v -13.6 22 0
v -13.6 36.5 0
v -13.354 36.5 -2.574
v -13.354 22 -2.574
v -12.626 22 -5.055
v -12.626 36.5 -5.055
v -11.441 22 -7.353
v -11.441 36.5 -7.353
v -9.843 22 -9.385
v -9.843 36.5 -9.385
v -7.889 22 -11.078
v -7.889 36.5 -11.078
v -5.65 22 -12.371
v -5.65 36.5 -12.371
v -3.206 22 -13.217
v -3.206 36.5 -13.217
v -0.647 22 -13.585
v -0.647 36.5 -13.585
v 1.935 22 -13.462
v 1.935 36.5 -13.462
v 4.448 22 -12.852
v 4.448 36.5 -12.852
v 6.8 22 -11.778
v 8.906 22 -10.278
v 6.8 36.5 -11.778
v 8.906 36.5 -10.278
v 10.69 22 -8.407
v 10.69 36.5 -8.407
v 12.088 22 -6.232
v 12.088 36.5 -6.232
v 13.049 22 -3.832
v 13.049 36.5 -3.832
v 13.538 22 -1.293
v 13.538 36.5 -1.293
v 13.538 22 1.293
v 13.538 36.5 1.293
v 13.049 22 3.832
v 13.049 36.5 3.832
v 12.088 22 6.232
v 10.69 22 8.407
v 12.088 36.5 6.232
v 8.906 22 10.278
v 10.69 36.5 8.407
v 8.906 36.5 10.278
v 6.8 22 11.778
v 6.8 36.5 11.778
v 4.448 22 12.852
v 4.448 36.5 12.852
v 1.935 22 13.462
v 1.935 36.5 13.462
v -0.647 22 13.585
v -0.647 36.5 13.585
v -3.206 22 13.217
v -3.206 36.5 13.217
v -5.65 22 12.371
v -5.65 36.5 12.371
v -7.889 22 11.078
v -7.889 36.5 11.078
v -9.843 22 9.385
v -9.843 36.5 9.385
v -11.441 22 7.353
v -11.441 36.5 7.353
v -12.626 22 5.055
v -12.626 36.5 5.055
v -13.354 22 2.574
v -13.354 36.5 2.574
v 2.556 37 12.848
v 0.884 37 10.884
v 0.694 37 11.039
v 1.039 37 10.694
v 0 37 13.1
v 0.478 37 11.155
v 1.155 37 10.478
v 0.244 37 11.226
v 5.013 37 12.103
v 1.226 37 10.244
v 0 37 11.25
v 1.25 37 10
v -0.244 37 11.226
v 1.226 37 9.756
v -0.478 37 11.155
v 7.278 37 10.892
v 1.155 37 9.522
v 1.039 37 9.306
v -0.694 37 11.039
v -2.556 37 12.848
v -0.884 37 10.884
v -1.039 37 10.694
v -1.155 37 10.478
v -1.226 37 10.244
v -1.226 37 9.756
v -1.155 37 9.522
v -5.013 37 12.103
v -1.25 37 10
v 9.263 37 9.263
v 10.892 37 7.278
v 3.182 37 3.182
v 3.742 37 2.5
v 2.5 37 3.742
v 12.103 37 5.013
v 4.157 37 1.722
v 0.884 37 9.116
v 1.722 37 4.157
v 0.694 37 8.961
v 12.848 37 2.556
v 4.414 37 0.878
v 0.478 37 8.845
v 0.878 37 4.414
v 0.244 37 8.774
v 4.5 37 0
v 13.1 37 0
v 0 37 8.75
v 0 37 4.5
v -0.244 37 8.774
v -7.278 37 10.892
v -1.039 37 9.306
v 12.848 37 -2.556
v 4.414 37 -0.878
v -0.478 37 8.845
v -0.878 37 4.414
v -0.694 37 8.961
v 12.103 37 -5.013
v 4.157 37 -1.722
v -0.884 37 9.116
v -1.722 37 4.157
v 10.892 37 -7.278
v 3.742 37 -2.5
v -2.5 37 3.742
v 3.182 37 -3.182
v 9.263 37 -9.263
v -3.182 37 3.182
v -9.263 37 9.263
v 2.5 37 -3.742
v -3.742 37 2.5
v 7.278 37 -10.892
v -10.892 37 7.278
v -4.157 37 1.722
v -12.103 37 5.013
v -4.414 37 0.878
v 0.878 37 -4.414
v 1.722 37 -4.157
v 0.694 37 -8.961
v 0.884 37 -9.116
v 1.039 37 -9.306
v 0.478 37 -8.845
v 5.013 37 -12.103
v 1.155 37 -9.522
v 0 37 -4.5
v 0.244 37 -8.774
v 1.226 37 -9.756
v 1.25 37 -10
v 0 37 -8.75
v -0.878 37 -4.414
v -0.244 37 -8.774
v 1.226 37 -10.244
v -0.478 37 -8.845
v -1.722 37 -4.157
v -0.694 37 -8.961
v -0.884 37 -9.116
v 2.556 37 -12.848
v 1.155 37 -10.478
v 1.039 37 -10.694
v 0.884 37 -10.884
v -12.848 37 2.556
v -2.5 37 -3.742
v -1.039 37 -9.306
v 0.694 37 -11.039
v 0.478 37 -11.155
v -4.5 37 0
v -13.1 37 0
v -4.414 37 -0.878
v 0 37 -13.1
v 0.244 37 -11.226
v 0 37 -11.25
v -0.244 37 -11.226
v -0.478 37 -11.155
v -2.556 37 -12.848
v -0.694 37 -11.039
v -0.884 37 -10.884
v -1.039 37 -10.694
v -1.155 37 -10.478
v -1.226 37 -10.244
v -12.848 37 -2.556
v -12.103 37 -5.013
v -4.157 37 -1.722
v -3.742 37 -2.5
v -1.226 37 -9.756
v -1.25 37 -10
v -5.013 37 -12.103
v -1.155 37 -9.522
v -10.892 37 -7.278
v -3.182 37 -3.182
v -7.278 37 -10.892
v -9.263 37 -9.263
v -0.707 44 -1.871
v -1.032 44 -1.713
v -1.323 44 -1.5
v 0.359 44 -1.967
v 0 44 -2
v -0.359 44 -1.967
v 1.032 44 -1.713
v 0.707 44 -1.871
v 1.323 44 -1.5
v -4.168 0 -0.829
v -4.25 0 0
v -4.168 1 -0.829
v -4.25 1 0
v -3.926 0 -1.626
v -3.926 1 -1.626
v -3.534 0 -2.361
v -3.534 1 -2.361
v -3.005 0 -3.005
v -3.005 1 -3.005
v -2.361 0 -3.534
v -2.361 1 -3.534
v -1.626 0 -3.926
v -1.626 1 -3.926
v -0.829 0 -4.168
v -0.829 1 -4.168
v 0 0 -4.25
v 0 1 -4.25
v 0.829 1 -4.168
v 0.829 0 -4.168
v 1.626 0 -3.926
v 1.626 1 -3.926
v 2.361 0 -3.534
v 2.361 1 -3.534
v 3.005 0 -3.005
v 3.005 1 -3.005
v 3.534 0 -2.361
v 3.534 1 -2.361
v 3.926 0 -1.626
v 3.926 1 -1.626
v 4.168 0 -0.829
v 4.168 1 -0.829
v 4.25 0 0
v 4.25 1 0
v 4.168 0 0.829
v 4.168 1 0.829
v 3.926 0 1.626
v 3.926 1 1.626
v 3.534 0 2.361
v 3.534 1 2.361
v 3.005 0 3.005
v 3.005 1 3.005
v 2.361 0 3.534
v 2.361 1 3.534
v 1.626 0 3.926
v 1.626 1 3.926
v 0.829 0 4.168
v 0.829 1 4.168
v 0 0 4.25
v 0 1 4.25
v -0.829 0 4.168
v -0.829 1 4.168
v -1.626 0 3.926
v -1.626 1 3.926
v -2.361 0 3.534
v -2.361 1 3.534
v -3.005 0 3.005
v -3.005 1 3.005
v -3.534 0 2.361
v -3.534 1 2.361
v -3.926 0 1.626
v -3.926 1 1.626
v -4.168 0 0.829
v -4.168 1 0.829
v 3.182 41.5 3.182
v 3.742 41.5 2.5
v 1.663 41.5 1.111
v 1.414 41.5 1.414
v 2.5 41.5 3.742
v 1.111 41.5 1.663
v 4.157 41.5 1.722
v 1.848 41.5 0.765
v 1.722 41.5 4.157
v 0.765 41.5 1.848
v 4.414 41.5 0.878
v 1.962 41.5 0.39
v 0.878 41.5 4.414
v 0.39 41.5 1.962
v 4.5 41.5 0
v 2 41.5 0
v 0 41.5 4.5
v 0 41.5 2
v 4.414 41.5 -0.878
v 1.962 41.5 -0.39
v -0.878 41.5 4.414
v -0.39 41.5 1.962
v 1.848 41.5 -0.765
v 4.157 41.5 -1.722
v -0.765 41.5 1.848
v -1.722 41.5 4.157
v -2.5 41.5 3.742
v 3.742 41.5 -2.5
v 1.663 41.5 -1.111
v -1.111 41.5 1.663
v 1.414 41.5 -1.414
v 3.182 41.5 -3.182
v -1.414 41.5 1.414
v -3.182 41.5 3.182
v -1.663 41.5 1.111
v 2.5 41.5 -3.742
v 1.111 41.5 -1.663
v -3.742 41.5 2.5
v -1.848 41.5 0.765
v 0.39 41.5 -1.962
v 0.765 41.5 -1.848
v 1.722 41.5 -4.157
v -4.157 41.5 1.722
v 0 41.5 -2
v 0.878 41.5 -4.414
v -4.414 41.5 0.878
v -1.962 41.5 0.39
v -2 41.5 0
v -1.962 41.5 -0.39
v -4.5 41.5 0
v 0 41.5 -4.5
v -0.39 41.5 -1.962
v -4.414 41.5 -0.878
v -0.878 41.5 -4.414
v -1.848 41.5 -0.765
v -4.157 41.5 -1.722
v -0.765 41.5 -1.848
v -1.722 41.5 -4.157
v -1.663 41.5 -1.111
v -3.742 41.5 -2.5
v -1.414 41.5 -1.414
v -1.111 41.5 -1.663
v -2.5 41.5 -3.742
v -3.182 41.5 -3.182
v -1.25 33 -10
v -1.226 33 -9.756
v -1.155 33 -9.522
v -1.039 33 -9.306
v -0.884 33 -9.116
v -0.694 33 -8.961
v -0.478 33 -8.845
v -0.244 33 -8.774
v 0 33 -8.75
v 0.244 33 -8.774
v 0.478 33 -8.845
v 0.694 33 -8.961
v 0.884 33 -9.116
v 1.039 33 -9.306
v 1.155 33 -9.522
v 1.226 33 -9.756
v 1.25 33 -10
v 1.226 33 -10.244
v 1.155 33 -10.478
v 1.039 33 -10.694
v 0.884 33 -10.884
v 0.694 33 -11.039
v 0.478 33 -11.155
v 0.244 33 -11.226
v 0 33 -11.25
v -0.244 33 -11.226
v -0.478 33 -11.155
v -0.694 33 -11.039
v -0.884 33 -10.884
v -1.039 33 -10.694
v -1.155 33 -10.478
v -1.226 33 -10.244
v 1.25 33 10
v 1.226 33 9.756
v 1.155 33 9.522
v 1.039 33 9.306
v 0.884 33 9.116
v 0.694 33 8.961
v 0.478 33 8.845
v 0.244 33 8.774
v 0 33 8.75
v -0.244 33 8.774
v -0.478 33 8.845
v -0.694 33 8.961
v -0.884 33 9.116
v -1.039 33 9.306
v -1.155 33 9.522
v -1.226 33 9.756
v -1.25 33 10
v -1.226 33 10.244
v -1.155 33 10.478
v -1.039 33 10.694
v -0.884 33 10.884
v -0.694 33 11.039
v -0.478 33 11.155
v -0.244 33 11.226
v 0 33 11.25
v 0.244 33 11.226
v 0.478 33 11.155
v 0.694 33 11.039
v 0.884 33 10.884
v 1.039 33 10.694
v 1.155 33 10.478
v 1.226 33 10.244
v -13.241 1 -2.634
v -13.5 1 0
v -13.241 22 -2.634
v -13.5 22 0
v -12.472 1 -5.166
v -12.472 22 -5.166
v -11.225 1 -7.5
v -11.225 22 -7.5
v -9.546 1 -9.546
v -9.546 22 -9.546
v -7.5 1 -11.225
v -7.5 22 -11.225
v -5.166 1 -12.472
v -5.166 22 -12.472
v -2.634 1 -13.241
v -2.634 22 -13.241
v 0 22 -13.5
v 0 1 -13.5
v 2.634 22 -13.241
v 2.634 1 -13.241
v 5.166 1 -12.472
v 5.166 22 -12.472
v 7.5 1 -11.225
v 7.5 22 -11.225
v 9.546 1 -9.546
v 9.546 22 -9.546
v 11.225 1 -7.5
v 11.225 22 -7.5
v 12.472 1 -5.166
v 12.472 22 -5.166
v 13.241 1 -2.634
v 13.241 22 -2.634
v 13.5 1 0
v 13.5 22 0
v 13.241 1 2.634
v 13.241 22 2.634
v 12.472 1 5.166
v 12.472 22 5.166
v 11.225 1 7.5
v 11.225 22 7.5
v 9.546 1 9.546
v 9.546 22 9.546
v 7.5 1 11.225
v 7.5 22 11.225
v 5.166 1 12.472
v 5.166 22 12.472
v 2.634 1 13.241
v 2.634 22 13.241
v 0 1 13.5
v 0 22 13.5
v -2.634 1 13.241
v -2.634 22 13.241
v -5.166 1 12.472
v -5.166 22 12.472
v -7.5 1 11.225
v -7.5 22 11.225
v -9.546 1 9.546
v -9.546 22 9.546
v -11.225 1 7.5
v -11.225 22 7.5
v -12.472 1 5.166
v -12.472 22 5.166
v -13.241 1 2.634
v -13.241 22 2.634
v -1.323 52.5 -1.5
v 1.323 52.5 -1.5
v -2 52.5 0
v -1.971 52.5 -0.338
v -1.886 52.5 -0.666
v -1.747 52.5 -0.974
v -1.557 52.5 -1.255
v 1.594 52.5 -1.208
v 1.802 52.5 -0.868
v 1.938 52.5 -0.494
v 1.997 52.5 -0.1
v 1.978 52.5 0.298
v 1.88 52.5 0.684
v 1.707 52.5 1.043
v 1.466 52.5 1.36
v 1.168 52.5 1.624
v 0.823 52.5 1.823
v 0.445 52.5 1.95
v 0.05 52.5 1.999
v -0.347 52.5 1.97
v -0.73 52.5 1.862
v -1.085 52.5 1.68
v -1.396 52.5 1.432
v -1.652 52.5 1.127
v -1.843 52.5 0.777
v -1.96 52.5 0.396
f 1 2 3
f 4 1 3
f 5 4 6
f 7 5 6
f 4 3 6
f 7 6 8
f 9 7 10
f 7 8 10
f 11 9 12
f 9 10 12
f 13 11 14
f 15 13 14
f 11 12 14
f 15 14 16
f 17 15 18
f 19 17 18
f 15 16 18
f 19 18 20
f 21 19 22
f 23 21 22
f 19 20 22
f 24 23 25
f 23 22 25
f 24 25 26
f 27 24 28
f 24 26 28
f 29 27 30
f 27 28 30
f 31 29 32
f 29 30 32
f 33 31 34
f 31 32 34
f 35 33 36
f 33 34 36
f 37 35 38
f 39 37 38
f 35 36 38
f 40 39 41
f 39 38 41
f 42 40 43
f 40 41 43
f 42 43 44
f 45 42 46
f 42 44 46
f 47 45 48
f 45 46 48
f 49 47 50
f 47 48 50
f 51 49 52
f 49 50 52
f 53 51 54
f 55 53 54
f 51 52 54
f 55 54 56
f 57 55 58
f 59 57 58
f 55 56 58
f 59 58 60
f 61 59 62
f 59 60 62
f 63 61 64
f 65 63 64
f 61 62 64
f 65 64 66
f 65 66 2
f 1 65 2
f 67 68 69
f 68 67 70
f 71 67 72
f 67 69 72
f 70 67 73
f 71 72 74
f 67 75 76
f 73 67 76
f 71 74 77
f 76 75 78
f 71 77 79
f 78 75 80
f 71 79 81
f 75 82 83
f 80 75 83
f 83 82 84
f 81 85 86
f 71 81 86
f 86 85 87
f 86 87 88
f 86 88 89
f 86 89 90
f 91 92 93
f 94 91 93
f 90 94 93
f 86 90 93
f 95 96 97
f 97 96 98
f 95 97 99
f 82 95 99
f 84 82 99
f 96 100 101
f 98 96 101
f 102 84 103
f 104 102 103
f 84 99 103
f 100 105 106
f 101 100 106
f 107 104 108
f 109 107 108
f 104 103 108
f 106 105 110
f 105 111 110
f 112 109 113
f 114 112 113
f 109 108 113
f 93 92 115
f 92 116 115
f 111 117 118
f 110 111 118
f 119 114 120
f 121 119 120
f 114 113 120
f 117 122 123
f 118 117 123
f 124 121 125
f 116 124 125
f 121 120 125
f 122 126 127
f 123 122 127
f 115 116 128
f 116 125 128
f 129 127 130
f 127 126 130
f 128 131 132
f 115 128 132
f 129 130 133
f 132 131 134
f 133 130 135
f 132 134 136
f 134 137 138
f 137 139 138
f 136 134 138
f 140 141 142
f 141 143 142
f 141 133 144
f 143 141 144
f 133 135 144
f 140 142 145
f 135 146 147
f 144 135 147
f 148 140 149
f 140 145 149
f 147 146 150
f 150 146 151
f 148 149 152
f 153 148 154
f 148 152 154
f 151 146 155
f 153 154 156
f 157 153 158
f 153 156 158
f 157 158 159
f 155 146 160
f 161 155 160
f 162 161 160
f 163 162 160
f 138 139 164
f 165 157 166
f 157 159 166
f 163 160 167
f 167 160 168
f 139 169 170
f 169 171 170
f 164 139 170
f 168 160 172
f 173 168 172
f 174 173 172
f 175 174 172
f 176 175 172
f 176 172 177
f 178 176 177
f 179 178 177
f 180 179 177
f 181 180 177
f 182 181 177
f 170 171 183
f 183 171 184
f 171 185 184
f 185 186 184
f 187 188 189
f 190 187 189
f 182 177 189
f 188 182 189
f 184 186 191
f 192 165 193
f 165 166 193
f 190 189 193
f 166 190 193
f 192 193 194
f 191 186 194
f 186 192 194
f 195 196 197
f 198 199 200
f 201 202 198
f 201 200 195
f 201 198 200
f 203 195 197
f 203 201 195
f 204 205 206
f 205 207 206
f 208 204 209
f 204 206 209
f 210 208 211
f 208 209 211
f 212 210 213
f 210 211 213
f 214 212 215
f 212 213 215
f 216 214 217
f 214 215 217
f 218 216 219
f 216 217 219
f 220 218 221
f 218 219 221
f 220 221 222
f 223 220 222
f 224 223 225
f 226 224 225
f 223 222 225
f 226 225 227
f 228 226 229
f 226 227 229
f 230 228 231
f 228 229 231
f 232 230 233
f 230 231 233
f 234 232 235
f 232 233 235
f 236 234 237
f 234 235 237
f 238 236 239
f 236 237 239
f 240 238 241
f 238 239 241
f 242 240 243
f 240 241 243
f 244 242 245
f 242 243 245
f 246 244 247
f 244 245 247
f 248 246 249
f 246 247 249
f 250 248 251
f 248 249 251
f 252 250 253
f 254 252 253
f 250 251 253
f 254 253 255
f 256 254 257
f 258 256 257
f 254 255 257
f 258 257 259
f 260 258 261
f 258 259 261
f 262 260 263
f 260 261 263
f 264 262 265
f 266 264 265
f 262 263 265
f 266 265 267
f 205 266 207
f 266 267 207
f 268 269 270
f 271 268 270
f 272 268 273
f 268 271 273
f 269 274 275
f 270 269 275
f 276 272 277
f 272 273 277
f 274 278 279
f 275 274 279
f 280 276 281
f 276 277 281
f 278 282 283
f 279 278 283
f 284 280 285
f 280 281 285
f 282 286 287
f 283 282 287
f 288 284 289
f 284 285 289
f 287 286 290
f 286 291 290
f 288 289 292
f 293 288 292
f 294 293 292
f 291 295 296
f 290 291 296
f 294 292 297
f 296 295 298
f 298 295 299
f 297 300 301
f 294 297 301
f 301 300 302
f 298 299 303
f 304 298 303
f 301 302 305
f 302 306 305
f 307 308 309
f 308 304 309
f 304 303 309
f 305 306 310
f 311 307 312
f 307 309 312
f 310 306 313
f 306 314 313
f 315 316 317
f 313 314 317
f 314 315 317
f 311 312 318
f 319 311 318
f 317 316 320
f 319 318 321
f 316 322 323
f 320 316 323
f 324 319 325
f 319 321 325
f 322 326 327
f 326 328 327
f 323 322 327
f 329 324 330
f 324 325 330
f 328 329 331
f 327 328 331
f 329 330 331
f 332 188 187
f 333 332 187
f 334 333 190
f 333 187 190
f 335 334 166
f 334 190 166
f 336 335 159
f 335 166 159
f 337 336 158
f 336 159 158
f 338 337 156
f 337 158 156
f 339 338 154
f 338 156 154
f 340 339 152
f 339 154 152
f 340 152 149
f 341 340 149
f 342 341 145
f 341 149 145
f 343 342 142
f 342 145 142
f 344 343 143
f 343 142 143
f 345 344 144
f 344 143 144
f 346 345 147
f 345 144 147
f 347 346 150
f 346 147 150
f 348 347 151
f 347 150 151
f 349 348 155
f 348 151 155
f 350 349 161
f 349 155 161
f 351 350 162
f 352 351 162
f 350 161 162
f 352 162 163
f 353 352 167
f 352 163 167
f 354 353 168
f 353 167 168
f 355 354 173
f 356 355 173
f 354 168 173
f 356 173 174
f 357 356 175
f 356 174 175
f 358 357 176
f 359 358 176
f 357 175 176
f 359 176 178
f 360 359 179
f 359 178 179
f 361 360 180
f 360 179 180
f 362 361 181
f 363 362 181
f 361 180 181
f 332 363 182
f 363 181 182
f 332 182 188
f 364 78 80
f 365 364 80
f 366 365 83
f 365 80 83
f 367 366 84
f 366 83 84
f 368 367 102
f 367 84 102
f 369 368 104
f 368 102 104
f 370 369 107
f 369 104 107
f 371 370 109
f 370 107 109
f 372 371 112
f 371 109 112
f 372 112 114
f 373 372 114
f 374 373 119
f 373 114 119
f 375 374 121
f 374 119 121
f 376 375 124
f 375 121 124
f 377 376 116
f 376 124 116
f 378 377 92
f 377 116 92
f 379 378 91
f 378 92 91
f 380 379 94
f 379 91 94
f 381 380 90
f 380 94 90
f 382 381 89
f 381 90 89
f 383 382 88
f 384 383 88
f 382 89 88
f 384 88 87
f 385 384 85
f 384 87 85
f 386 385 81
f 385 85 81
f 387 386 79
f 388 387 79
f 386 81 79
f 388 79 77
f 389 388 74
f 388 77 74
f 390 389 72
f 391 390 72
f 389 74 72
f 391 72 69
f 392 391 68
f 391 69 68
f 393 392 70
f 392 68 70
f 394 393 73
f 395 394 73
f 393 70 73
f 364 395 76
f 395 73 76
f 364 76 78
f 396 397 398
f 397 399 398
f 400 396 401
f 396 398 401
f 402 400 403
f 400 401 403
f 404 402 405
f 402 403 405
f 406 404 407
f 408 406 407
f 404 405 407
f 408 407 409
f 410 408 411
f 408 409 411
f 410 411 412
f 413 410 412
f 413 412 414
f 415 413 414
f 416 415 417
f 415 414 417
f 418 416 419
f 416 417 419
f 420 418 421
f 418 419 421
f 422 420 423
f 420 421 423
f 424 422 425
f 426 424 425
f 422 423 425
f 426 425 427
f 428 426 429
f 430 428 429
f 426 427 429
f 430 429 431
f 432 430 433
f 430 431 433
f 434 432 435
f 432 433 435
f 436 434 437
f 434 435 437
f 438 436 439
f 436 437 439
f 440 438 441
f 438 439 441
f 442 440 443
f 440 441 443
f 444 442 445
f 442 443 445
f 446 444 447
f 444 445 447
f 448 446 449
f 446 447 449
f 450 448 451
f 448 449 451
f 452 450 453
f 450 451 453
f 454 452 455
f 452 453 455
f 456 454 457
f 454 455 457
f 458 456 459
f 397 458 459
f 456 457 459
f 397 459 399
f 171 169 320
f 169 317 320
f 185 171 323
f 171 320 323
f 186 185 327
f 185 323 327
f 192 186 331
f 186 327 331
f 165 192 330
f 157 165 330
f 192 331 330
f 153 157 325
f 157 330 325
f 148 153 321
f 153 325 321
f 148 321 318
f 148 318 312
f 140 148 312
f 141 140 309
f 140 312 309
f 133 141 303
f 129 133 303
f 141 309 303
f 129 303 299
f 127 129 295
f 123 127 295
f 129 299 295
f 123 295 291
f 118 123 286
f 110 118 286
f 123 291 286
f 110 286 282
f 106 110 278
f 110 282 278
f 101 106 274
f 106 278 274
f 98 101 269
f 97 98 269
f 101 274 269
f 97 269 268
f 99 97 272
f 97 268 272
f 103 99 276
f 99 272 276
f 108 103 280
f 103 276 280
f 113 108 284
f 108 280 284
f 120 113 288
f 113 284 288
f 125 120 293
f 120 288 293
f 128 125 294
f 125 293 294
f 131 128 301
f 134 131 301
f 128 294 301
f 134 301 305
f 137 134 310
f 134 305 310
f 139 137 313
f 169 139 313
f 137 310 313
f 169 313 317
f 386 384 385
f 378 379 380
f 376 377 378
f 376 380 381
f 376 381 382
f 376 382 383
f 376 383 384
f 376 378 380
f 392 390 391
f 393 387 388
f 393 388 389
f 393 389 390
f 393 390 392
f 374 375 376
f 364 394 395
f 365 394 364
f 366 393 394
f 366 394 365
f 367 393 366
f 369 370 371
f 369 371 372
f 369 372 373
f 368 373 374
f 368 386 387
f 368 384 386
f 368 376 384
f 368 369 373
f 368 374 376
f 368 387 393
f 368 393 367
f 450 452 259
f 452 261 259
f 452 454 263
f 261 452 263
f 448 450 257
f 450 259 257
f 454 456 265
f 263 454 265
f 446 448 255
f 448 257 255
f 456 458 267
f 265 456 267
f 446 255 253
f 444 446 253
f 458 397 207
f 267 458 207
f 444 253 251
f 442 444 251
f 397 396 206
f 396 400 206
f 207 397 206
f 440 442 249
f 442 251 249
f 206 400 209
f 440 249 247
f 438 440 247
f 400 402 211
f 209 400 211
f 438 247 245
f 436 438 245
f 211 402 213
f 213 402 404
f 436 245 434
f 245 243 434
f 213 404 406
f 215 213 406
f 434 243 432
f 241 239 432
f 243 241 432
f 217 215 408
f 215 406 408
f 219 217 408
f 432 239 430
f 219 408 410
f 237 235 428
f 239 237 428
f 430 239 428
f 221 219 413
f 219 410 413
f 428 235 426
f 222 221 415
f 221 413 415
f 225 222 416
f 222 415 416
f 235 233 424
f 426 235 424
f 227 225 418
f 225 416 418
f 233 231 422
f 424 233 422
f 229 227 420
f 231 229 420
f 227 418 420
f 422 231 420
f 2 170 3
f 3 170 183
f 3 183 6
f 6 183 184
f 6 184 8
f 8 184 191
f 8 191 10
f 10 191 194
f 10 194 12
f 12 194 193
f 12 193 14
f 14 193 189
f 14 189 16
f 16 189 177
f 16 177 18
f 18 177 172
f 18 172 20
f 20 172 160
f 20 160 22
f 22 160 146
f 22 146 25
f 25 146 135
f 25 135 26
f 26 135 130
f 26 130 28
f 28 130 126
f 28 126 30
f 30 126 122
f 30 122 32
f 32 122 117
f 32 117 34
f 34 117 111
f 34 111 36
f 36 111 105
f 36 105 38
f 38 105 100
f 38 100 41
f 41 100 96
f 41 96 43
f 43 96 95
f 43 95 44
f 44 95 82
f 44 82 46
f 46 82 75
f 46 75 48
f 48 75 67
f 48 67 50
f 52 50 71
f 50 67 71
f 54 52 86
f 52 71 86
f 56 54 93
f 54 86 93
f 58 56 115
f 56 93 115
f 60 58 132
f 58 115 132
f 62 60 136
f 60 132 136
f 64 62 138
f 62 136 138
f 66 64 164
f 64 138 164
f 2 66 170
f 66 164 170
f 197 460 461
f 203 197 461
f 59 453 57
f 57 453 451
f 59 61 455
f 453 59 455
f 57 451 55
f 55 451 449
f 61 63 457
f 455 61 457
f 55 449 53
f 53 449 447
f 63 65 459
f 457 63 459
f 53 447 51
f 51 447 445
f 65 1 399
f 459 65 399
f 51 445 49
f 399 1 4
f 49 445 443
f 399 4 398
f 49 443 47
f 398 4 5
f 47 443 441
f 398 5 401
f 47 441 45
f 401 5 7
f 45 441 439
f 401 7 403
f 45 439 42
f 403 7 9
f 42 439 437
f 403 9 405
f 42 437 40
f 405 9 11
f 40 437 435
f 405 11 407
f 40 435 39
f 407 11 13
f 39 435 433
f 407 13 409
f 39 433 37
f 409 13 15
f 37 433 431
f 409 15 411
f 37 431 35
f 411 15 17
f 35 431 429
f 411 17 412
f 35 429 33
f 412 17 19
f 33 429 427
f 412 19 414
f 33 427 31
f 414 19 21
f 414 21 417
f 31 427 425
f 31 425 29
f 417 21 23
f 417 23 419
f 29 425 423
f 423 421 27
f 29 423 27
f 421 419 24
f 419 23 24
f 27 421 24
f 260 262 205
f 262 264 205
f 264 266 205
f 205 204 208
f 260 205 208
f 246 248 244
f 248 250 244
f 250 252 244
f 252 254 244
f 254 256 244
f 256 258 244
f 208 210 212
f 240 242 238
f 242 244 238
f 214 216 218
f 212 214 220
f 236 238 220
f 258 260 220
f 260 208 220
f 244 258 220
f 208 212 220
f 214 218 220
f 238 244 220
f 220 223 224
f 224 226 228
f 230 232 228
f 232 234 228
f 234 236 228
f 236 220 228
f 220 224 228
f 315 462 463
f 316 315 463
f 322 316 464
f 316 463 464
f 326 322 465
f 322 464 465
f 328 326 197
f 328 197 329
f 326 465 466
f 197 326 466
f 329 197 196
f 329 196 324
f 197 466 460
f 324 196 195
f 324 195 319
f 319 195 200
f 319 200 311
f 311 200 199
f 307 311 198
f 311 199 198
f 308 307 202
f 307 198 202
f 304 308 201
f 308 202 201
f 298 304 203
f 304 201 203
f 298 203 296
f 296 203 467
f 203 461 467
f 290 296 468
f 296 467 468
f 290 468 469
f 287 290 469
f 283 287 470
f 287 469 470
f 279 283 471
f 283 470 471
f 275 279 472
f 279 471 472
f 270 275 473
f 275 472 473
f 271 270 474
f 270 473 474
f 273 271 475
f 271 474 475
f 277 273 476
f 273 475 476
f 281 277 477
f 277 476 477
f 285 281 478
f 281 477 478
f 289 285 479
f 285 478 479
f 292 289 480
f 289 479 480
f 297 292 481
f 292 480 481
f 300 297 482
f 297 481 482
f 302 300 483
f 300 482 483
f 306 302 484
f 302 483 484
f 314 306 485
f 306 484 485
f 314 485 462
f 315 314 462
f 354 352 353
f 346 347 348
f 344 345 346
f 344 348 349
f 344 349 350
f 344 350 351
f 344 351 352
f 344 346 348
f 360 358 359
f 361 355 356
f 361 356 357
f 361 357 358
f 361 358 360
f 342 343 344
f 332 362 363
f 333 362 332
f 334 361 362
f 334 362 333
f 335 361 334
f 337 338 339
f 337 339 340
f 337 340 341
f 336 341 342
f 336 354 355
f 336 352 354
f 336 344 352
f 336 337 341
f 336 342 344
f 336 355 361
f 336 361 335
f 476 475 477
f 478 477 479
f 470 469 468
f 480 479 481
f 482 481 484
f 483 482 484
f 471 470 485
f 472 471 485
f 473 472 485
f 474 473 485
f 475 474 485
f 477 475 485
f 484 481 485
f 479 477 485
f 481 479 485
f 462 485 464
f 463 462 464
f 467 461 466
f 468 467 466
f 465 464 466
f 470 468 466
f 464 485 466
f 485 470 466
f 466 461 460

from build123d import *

# Parameters (mm, degrees)
ENL_V_MAT_EXTRU_1_DEPTH = 8.5
ESQUISSE3_R             = 1.25
ENL_V_MAT_EXTRU_2_DEPTH = 4
CHANFREIN1_SIZE         = 0.5


with BuildPart() as part:
    # Esquisse1 → Révolution1 (revolve)
    with BuildSketch(Plane.XY, mode=Mode.PRIVATE) as r_volution1_sk:
        Polygon((4.25, 1), (13.5, 1), (13.5, 22), (13.6, 22), (13.6, 37), (4.5, 37), (4.5, 41.5), (2, 41.5), (2, 52.5), (0, 52.5), (0, 0), (4.25, 0), align=None)
    revolve(r_volution1_sk.sketch.rotate(Axis((0, 52.5, 0), (0, -1, 0)), 180), axis=Axis((0, 52.5, 0), (0, -1, 0)))

    # Esquisse2 → Enlèv. mat.-Extru.1 (cut)
    with BuildSketch(Plane(origin=(0, 52.5, 0), x_dir=(1, 0, 0), z_dir=(0, 1, 0))):
        with BuildLine():
            Line((-1.322875656, 1.5), (1.322875656, 1.5))
            ThreePointArc((1.322875656, 1.5), (0, 2), (-1.322875656, 1.5))
        make_face()
    extrude(amount=-ENL_V_MAT_EXTRU_1_DEPTH, mode=Mode.SUBTRACT)

    # Esquisse3 → Enlèv. mat.-Extru.2 (cut)
    with BuildSketch(Plane(origin=(0, 37, 0), x_dir=(1, 0, 0), z_dir=(0, 1, 0))):
        with Locations(Location((0, 10, 0), (0, 0, 180))):
            Circle(ESQUISSE3_R)
        with Locations((0, -10)):
            Circle(ESQUISSE3_R)
    extrude(amount=-ENL_V_MAT_EXTRU_2_DEPTH, mode=Mode.SUBTRACT)

    # Chanfrein1
    chanfrein1_edges = [part.edges().sort_by_distance(p)[0] for p in [
        (13.6, 37, 0),
    ]]
    chamfer(chanfrein1_edges, length=CHANFREIN1_SIZE)


solid = part.part
